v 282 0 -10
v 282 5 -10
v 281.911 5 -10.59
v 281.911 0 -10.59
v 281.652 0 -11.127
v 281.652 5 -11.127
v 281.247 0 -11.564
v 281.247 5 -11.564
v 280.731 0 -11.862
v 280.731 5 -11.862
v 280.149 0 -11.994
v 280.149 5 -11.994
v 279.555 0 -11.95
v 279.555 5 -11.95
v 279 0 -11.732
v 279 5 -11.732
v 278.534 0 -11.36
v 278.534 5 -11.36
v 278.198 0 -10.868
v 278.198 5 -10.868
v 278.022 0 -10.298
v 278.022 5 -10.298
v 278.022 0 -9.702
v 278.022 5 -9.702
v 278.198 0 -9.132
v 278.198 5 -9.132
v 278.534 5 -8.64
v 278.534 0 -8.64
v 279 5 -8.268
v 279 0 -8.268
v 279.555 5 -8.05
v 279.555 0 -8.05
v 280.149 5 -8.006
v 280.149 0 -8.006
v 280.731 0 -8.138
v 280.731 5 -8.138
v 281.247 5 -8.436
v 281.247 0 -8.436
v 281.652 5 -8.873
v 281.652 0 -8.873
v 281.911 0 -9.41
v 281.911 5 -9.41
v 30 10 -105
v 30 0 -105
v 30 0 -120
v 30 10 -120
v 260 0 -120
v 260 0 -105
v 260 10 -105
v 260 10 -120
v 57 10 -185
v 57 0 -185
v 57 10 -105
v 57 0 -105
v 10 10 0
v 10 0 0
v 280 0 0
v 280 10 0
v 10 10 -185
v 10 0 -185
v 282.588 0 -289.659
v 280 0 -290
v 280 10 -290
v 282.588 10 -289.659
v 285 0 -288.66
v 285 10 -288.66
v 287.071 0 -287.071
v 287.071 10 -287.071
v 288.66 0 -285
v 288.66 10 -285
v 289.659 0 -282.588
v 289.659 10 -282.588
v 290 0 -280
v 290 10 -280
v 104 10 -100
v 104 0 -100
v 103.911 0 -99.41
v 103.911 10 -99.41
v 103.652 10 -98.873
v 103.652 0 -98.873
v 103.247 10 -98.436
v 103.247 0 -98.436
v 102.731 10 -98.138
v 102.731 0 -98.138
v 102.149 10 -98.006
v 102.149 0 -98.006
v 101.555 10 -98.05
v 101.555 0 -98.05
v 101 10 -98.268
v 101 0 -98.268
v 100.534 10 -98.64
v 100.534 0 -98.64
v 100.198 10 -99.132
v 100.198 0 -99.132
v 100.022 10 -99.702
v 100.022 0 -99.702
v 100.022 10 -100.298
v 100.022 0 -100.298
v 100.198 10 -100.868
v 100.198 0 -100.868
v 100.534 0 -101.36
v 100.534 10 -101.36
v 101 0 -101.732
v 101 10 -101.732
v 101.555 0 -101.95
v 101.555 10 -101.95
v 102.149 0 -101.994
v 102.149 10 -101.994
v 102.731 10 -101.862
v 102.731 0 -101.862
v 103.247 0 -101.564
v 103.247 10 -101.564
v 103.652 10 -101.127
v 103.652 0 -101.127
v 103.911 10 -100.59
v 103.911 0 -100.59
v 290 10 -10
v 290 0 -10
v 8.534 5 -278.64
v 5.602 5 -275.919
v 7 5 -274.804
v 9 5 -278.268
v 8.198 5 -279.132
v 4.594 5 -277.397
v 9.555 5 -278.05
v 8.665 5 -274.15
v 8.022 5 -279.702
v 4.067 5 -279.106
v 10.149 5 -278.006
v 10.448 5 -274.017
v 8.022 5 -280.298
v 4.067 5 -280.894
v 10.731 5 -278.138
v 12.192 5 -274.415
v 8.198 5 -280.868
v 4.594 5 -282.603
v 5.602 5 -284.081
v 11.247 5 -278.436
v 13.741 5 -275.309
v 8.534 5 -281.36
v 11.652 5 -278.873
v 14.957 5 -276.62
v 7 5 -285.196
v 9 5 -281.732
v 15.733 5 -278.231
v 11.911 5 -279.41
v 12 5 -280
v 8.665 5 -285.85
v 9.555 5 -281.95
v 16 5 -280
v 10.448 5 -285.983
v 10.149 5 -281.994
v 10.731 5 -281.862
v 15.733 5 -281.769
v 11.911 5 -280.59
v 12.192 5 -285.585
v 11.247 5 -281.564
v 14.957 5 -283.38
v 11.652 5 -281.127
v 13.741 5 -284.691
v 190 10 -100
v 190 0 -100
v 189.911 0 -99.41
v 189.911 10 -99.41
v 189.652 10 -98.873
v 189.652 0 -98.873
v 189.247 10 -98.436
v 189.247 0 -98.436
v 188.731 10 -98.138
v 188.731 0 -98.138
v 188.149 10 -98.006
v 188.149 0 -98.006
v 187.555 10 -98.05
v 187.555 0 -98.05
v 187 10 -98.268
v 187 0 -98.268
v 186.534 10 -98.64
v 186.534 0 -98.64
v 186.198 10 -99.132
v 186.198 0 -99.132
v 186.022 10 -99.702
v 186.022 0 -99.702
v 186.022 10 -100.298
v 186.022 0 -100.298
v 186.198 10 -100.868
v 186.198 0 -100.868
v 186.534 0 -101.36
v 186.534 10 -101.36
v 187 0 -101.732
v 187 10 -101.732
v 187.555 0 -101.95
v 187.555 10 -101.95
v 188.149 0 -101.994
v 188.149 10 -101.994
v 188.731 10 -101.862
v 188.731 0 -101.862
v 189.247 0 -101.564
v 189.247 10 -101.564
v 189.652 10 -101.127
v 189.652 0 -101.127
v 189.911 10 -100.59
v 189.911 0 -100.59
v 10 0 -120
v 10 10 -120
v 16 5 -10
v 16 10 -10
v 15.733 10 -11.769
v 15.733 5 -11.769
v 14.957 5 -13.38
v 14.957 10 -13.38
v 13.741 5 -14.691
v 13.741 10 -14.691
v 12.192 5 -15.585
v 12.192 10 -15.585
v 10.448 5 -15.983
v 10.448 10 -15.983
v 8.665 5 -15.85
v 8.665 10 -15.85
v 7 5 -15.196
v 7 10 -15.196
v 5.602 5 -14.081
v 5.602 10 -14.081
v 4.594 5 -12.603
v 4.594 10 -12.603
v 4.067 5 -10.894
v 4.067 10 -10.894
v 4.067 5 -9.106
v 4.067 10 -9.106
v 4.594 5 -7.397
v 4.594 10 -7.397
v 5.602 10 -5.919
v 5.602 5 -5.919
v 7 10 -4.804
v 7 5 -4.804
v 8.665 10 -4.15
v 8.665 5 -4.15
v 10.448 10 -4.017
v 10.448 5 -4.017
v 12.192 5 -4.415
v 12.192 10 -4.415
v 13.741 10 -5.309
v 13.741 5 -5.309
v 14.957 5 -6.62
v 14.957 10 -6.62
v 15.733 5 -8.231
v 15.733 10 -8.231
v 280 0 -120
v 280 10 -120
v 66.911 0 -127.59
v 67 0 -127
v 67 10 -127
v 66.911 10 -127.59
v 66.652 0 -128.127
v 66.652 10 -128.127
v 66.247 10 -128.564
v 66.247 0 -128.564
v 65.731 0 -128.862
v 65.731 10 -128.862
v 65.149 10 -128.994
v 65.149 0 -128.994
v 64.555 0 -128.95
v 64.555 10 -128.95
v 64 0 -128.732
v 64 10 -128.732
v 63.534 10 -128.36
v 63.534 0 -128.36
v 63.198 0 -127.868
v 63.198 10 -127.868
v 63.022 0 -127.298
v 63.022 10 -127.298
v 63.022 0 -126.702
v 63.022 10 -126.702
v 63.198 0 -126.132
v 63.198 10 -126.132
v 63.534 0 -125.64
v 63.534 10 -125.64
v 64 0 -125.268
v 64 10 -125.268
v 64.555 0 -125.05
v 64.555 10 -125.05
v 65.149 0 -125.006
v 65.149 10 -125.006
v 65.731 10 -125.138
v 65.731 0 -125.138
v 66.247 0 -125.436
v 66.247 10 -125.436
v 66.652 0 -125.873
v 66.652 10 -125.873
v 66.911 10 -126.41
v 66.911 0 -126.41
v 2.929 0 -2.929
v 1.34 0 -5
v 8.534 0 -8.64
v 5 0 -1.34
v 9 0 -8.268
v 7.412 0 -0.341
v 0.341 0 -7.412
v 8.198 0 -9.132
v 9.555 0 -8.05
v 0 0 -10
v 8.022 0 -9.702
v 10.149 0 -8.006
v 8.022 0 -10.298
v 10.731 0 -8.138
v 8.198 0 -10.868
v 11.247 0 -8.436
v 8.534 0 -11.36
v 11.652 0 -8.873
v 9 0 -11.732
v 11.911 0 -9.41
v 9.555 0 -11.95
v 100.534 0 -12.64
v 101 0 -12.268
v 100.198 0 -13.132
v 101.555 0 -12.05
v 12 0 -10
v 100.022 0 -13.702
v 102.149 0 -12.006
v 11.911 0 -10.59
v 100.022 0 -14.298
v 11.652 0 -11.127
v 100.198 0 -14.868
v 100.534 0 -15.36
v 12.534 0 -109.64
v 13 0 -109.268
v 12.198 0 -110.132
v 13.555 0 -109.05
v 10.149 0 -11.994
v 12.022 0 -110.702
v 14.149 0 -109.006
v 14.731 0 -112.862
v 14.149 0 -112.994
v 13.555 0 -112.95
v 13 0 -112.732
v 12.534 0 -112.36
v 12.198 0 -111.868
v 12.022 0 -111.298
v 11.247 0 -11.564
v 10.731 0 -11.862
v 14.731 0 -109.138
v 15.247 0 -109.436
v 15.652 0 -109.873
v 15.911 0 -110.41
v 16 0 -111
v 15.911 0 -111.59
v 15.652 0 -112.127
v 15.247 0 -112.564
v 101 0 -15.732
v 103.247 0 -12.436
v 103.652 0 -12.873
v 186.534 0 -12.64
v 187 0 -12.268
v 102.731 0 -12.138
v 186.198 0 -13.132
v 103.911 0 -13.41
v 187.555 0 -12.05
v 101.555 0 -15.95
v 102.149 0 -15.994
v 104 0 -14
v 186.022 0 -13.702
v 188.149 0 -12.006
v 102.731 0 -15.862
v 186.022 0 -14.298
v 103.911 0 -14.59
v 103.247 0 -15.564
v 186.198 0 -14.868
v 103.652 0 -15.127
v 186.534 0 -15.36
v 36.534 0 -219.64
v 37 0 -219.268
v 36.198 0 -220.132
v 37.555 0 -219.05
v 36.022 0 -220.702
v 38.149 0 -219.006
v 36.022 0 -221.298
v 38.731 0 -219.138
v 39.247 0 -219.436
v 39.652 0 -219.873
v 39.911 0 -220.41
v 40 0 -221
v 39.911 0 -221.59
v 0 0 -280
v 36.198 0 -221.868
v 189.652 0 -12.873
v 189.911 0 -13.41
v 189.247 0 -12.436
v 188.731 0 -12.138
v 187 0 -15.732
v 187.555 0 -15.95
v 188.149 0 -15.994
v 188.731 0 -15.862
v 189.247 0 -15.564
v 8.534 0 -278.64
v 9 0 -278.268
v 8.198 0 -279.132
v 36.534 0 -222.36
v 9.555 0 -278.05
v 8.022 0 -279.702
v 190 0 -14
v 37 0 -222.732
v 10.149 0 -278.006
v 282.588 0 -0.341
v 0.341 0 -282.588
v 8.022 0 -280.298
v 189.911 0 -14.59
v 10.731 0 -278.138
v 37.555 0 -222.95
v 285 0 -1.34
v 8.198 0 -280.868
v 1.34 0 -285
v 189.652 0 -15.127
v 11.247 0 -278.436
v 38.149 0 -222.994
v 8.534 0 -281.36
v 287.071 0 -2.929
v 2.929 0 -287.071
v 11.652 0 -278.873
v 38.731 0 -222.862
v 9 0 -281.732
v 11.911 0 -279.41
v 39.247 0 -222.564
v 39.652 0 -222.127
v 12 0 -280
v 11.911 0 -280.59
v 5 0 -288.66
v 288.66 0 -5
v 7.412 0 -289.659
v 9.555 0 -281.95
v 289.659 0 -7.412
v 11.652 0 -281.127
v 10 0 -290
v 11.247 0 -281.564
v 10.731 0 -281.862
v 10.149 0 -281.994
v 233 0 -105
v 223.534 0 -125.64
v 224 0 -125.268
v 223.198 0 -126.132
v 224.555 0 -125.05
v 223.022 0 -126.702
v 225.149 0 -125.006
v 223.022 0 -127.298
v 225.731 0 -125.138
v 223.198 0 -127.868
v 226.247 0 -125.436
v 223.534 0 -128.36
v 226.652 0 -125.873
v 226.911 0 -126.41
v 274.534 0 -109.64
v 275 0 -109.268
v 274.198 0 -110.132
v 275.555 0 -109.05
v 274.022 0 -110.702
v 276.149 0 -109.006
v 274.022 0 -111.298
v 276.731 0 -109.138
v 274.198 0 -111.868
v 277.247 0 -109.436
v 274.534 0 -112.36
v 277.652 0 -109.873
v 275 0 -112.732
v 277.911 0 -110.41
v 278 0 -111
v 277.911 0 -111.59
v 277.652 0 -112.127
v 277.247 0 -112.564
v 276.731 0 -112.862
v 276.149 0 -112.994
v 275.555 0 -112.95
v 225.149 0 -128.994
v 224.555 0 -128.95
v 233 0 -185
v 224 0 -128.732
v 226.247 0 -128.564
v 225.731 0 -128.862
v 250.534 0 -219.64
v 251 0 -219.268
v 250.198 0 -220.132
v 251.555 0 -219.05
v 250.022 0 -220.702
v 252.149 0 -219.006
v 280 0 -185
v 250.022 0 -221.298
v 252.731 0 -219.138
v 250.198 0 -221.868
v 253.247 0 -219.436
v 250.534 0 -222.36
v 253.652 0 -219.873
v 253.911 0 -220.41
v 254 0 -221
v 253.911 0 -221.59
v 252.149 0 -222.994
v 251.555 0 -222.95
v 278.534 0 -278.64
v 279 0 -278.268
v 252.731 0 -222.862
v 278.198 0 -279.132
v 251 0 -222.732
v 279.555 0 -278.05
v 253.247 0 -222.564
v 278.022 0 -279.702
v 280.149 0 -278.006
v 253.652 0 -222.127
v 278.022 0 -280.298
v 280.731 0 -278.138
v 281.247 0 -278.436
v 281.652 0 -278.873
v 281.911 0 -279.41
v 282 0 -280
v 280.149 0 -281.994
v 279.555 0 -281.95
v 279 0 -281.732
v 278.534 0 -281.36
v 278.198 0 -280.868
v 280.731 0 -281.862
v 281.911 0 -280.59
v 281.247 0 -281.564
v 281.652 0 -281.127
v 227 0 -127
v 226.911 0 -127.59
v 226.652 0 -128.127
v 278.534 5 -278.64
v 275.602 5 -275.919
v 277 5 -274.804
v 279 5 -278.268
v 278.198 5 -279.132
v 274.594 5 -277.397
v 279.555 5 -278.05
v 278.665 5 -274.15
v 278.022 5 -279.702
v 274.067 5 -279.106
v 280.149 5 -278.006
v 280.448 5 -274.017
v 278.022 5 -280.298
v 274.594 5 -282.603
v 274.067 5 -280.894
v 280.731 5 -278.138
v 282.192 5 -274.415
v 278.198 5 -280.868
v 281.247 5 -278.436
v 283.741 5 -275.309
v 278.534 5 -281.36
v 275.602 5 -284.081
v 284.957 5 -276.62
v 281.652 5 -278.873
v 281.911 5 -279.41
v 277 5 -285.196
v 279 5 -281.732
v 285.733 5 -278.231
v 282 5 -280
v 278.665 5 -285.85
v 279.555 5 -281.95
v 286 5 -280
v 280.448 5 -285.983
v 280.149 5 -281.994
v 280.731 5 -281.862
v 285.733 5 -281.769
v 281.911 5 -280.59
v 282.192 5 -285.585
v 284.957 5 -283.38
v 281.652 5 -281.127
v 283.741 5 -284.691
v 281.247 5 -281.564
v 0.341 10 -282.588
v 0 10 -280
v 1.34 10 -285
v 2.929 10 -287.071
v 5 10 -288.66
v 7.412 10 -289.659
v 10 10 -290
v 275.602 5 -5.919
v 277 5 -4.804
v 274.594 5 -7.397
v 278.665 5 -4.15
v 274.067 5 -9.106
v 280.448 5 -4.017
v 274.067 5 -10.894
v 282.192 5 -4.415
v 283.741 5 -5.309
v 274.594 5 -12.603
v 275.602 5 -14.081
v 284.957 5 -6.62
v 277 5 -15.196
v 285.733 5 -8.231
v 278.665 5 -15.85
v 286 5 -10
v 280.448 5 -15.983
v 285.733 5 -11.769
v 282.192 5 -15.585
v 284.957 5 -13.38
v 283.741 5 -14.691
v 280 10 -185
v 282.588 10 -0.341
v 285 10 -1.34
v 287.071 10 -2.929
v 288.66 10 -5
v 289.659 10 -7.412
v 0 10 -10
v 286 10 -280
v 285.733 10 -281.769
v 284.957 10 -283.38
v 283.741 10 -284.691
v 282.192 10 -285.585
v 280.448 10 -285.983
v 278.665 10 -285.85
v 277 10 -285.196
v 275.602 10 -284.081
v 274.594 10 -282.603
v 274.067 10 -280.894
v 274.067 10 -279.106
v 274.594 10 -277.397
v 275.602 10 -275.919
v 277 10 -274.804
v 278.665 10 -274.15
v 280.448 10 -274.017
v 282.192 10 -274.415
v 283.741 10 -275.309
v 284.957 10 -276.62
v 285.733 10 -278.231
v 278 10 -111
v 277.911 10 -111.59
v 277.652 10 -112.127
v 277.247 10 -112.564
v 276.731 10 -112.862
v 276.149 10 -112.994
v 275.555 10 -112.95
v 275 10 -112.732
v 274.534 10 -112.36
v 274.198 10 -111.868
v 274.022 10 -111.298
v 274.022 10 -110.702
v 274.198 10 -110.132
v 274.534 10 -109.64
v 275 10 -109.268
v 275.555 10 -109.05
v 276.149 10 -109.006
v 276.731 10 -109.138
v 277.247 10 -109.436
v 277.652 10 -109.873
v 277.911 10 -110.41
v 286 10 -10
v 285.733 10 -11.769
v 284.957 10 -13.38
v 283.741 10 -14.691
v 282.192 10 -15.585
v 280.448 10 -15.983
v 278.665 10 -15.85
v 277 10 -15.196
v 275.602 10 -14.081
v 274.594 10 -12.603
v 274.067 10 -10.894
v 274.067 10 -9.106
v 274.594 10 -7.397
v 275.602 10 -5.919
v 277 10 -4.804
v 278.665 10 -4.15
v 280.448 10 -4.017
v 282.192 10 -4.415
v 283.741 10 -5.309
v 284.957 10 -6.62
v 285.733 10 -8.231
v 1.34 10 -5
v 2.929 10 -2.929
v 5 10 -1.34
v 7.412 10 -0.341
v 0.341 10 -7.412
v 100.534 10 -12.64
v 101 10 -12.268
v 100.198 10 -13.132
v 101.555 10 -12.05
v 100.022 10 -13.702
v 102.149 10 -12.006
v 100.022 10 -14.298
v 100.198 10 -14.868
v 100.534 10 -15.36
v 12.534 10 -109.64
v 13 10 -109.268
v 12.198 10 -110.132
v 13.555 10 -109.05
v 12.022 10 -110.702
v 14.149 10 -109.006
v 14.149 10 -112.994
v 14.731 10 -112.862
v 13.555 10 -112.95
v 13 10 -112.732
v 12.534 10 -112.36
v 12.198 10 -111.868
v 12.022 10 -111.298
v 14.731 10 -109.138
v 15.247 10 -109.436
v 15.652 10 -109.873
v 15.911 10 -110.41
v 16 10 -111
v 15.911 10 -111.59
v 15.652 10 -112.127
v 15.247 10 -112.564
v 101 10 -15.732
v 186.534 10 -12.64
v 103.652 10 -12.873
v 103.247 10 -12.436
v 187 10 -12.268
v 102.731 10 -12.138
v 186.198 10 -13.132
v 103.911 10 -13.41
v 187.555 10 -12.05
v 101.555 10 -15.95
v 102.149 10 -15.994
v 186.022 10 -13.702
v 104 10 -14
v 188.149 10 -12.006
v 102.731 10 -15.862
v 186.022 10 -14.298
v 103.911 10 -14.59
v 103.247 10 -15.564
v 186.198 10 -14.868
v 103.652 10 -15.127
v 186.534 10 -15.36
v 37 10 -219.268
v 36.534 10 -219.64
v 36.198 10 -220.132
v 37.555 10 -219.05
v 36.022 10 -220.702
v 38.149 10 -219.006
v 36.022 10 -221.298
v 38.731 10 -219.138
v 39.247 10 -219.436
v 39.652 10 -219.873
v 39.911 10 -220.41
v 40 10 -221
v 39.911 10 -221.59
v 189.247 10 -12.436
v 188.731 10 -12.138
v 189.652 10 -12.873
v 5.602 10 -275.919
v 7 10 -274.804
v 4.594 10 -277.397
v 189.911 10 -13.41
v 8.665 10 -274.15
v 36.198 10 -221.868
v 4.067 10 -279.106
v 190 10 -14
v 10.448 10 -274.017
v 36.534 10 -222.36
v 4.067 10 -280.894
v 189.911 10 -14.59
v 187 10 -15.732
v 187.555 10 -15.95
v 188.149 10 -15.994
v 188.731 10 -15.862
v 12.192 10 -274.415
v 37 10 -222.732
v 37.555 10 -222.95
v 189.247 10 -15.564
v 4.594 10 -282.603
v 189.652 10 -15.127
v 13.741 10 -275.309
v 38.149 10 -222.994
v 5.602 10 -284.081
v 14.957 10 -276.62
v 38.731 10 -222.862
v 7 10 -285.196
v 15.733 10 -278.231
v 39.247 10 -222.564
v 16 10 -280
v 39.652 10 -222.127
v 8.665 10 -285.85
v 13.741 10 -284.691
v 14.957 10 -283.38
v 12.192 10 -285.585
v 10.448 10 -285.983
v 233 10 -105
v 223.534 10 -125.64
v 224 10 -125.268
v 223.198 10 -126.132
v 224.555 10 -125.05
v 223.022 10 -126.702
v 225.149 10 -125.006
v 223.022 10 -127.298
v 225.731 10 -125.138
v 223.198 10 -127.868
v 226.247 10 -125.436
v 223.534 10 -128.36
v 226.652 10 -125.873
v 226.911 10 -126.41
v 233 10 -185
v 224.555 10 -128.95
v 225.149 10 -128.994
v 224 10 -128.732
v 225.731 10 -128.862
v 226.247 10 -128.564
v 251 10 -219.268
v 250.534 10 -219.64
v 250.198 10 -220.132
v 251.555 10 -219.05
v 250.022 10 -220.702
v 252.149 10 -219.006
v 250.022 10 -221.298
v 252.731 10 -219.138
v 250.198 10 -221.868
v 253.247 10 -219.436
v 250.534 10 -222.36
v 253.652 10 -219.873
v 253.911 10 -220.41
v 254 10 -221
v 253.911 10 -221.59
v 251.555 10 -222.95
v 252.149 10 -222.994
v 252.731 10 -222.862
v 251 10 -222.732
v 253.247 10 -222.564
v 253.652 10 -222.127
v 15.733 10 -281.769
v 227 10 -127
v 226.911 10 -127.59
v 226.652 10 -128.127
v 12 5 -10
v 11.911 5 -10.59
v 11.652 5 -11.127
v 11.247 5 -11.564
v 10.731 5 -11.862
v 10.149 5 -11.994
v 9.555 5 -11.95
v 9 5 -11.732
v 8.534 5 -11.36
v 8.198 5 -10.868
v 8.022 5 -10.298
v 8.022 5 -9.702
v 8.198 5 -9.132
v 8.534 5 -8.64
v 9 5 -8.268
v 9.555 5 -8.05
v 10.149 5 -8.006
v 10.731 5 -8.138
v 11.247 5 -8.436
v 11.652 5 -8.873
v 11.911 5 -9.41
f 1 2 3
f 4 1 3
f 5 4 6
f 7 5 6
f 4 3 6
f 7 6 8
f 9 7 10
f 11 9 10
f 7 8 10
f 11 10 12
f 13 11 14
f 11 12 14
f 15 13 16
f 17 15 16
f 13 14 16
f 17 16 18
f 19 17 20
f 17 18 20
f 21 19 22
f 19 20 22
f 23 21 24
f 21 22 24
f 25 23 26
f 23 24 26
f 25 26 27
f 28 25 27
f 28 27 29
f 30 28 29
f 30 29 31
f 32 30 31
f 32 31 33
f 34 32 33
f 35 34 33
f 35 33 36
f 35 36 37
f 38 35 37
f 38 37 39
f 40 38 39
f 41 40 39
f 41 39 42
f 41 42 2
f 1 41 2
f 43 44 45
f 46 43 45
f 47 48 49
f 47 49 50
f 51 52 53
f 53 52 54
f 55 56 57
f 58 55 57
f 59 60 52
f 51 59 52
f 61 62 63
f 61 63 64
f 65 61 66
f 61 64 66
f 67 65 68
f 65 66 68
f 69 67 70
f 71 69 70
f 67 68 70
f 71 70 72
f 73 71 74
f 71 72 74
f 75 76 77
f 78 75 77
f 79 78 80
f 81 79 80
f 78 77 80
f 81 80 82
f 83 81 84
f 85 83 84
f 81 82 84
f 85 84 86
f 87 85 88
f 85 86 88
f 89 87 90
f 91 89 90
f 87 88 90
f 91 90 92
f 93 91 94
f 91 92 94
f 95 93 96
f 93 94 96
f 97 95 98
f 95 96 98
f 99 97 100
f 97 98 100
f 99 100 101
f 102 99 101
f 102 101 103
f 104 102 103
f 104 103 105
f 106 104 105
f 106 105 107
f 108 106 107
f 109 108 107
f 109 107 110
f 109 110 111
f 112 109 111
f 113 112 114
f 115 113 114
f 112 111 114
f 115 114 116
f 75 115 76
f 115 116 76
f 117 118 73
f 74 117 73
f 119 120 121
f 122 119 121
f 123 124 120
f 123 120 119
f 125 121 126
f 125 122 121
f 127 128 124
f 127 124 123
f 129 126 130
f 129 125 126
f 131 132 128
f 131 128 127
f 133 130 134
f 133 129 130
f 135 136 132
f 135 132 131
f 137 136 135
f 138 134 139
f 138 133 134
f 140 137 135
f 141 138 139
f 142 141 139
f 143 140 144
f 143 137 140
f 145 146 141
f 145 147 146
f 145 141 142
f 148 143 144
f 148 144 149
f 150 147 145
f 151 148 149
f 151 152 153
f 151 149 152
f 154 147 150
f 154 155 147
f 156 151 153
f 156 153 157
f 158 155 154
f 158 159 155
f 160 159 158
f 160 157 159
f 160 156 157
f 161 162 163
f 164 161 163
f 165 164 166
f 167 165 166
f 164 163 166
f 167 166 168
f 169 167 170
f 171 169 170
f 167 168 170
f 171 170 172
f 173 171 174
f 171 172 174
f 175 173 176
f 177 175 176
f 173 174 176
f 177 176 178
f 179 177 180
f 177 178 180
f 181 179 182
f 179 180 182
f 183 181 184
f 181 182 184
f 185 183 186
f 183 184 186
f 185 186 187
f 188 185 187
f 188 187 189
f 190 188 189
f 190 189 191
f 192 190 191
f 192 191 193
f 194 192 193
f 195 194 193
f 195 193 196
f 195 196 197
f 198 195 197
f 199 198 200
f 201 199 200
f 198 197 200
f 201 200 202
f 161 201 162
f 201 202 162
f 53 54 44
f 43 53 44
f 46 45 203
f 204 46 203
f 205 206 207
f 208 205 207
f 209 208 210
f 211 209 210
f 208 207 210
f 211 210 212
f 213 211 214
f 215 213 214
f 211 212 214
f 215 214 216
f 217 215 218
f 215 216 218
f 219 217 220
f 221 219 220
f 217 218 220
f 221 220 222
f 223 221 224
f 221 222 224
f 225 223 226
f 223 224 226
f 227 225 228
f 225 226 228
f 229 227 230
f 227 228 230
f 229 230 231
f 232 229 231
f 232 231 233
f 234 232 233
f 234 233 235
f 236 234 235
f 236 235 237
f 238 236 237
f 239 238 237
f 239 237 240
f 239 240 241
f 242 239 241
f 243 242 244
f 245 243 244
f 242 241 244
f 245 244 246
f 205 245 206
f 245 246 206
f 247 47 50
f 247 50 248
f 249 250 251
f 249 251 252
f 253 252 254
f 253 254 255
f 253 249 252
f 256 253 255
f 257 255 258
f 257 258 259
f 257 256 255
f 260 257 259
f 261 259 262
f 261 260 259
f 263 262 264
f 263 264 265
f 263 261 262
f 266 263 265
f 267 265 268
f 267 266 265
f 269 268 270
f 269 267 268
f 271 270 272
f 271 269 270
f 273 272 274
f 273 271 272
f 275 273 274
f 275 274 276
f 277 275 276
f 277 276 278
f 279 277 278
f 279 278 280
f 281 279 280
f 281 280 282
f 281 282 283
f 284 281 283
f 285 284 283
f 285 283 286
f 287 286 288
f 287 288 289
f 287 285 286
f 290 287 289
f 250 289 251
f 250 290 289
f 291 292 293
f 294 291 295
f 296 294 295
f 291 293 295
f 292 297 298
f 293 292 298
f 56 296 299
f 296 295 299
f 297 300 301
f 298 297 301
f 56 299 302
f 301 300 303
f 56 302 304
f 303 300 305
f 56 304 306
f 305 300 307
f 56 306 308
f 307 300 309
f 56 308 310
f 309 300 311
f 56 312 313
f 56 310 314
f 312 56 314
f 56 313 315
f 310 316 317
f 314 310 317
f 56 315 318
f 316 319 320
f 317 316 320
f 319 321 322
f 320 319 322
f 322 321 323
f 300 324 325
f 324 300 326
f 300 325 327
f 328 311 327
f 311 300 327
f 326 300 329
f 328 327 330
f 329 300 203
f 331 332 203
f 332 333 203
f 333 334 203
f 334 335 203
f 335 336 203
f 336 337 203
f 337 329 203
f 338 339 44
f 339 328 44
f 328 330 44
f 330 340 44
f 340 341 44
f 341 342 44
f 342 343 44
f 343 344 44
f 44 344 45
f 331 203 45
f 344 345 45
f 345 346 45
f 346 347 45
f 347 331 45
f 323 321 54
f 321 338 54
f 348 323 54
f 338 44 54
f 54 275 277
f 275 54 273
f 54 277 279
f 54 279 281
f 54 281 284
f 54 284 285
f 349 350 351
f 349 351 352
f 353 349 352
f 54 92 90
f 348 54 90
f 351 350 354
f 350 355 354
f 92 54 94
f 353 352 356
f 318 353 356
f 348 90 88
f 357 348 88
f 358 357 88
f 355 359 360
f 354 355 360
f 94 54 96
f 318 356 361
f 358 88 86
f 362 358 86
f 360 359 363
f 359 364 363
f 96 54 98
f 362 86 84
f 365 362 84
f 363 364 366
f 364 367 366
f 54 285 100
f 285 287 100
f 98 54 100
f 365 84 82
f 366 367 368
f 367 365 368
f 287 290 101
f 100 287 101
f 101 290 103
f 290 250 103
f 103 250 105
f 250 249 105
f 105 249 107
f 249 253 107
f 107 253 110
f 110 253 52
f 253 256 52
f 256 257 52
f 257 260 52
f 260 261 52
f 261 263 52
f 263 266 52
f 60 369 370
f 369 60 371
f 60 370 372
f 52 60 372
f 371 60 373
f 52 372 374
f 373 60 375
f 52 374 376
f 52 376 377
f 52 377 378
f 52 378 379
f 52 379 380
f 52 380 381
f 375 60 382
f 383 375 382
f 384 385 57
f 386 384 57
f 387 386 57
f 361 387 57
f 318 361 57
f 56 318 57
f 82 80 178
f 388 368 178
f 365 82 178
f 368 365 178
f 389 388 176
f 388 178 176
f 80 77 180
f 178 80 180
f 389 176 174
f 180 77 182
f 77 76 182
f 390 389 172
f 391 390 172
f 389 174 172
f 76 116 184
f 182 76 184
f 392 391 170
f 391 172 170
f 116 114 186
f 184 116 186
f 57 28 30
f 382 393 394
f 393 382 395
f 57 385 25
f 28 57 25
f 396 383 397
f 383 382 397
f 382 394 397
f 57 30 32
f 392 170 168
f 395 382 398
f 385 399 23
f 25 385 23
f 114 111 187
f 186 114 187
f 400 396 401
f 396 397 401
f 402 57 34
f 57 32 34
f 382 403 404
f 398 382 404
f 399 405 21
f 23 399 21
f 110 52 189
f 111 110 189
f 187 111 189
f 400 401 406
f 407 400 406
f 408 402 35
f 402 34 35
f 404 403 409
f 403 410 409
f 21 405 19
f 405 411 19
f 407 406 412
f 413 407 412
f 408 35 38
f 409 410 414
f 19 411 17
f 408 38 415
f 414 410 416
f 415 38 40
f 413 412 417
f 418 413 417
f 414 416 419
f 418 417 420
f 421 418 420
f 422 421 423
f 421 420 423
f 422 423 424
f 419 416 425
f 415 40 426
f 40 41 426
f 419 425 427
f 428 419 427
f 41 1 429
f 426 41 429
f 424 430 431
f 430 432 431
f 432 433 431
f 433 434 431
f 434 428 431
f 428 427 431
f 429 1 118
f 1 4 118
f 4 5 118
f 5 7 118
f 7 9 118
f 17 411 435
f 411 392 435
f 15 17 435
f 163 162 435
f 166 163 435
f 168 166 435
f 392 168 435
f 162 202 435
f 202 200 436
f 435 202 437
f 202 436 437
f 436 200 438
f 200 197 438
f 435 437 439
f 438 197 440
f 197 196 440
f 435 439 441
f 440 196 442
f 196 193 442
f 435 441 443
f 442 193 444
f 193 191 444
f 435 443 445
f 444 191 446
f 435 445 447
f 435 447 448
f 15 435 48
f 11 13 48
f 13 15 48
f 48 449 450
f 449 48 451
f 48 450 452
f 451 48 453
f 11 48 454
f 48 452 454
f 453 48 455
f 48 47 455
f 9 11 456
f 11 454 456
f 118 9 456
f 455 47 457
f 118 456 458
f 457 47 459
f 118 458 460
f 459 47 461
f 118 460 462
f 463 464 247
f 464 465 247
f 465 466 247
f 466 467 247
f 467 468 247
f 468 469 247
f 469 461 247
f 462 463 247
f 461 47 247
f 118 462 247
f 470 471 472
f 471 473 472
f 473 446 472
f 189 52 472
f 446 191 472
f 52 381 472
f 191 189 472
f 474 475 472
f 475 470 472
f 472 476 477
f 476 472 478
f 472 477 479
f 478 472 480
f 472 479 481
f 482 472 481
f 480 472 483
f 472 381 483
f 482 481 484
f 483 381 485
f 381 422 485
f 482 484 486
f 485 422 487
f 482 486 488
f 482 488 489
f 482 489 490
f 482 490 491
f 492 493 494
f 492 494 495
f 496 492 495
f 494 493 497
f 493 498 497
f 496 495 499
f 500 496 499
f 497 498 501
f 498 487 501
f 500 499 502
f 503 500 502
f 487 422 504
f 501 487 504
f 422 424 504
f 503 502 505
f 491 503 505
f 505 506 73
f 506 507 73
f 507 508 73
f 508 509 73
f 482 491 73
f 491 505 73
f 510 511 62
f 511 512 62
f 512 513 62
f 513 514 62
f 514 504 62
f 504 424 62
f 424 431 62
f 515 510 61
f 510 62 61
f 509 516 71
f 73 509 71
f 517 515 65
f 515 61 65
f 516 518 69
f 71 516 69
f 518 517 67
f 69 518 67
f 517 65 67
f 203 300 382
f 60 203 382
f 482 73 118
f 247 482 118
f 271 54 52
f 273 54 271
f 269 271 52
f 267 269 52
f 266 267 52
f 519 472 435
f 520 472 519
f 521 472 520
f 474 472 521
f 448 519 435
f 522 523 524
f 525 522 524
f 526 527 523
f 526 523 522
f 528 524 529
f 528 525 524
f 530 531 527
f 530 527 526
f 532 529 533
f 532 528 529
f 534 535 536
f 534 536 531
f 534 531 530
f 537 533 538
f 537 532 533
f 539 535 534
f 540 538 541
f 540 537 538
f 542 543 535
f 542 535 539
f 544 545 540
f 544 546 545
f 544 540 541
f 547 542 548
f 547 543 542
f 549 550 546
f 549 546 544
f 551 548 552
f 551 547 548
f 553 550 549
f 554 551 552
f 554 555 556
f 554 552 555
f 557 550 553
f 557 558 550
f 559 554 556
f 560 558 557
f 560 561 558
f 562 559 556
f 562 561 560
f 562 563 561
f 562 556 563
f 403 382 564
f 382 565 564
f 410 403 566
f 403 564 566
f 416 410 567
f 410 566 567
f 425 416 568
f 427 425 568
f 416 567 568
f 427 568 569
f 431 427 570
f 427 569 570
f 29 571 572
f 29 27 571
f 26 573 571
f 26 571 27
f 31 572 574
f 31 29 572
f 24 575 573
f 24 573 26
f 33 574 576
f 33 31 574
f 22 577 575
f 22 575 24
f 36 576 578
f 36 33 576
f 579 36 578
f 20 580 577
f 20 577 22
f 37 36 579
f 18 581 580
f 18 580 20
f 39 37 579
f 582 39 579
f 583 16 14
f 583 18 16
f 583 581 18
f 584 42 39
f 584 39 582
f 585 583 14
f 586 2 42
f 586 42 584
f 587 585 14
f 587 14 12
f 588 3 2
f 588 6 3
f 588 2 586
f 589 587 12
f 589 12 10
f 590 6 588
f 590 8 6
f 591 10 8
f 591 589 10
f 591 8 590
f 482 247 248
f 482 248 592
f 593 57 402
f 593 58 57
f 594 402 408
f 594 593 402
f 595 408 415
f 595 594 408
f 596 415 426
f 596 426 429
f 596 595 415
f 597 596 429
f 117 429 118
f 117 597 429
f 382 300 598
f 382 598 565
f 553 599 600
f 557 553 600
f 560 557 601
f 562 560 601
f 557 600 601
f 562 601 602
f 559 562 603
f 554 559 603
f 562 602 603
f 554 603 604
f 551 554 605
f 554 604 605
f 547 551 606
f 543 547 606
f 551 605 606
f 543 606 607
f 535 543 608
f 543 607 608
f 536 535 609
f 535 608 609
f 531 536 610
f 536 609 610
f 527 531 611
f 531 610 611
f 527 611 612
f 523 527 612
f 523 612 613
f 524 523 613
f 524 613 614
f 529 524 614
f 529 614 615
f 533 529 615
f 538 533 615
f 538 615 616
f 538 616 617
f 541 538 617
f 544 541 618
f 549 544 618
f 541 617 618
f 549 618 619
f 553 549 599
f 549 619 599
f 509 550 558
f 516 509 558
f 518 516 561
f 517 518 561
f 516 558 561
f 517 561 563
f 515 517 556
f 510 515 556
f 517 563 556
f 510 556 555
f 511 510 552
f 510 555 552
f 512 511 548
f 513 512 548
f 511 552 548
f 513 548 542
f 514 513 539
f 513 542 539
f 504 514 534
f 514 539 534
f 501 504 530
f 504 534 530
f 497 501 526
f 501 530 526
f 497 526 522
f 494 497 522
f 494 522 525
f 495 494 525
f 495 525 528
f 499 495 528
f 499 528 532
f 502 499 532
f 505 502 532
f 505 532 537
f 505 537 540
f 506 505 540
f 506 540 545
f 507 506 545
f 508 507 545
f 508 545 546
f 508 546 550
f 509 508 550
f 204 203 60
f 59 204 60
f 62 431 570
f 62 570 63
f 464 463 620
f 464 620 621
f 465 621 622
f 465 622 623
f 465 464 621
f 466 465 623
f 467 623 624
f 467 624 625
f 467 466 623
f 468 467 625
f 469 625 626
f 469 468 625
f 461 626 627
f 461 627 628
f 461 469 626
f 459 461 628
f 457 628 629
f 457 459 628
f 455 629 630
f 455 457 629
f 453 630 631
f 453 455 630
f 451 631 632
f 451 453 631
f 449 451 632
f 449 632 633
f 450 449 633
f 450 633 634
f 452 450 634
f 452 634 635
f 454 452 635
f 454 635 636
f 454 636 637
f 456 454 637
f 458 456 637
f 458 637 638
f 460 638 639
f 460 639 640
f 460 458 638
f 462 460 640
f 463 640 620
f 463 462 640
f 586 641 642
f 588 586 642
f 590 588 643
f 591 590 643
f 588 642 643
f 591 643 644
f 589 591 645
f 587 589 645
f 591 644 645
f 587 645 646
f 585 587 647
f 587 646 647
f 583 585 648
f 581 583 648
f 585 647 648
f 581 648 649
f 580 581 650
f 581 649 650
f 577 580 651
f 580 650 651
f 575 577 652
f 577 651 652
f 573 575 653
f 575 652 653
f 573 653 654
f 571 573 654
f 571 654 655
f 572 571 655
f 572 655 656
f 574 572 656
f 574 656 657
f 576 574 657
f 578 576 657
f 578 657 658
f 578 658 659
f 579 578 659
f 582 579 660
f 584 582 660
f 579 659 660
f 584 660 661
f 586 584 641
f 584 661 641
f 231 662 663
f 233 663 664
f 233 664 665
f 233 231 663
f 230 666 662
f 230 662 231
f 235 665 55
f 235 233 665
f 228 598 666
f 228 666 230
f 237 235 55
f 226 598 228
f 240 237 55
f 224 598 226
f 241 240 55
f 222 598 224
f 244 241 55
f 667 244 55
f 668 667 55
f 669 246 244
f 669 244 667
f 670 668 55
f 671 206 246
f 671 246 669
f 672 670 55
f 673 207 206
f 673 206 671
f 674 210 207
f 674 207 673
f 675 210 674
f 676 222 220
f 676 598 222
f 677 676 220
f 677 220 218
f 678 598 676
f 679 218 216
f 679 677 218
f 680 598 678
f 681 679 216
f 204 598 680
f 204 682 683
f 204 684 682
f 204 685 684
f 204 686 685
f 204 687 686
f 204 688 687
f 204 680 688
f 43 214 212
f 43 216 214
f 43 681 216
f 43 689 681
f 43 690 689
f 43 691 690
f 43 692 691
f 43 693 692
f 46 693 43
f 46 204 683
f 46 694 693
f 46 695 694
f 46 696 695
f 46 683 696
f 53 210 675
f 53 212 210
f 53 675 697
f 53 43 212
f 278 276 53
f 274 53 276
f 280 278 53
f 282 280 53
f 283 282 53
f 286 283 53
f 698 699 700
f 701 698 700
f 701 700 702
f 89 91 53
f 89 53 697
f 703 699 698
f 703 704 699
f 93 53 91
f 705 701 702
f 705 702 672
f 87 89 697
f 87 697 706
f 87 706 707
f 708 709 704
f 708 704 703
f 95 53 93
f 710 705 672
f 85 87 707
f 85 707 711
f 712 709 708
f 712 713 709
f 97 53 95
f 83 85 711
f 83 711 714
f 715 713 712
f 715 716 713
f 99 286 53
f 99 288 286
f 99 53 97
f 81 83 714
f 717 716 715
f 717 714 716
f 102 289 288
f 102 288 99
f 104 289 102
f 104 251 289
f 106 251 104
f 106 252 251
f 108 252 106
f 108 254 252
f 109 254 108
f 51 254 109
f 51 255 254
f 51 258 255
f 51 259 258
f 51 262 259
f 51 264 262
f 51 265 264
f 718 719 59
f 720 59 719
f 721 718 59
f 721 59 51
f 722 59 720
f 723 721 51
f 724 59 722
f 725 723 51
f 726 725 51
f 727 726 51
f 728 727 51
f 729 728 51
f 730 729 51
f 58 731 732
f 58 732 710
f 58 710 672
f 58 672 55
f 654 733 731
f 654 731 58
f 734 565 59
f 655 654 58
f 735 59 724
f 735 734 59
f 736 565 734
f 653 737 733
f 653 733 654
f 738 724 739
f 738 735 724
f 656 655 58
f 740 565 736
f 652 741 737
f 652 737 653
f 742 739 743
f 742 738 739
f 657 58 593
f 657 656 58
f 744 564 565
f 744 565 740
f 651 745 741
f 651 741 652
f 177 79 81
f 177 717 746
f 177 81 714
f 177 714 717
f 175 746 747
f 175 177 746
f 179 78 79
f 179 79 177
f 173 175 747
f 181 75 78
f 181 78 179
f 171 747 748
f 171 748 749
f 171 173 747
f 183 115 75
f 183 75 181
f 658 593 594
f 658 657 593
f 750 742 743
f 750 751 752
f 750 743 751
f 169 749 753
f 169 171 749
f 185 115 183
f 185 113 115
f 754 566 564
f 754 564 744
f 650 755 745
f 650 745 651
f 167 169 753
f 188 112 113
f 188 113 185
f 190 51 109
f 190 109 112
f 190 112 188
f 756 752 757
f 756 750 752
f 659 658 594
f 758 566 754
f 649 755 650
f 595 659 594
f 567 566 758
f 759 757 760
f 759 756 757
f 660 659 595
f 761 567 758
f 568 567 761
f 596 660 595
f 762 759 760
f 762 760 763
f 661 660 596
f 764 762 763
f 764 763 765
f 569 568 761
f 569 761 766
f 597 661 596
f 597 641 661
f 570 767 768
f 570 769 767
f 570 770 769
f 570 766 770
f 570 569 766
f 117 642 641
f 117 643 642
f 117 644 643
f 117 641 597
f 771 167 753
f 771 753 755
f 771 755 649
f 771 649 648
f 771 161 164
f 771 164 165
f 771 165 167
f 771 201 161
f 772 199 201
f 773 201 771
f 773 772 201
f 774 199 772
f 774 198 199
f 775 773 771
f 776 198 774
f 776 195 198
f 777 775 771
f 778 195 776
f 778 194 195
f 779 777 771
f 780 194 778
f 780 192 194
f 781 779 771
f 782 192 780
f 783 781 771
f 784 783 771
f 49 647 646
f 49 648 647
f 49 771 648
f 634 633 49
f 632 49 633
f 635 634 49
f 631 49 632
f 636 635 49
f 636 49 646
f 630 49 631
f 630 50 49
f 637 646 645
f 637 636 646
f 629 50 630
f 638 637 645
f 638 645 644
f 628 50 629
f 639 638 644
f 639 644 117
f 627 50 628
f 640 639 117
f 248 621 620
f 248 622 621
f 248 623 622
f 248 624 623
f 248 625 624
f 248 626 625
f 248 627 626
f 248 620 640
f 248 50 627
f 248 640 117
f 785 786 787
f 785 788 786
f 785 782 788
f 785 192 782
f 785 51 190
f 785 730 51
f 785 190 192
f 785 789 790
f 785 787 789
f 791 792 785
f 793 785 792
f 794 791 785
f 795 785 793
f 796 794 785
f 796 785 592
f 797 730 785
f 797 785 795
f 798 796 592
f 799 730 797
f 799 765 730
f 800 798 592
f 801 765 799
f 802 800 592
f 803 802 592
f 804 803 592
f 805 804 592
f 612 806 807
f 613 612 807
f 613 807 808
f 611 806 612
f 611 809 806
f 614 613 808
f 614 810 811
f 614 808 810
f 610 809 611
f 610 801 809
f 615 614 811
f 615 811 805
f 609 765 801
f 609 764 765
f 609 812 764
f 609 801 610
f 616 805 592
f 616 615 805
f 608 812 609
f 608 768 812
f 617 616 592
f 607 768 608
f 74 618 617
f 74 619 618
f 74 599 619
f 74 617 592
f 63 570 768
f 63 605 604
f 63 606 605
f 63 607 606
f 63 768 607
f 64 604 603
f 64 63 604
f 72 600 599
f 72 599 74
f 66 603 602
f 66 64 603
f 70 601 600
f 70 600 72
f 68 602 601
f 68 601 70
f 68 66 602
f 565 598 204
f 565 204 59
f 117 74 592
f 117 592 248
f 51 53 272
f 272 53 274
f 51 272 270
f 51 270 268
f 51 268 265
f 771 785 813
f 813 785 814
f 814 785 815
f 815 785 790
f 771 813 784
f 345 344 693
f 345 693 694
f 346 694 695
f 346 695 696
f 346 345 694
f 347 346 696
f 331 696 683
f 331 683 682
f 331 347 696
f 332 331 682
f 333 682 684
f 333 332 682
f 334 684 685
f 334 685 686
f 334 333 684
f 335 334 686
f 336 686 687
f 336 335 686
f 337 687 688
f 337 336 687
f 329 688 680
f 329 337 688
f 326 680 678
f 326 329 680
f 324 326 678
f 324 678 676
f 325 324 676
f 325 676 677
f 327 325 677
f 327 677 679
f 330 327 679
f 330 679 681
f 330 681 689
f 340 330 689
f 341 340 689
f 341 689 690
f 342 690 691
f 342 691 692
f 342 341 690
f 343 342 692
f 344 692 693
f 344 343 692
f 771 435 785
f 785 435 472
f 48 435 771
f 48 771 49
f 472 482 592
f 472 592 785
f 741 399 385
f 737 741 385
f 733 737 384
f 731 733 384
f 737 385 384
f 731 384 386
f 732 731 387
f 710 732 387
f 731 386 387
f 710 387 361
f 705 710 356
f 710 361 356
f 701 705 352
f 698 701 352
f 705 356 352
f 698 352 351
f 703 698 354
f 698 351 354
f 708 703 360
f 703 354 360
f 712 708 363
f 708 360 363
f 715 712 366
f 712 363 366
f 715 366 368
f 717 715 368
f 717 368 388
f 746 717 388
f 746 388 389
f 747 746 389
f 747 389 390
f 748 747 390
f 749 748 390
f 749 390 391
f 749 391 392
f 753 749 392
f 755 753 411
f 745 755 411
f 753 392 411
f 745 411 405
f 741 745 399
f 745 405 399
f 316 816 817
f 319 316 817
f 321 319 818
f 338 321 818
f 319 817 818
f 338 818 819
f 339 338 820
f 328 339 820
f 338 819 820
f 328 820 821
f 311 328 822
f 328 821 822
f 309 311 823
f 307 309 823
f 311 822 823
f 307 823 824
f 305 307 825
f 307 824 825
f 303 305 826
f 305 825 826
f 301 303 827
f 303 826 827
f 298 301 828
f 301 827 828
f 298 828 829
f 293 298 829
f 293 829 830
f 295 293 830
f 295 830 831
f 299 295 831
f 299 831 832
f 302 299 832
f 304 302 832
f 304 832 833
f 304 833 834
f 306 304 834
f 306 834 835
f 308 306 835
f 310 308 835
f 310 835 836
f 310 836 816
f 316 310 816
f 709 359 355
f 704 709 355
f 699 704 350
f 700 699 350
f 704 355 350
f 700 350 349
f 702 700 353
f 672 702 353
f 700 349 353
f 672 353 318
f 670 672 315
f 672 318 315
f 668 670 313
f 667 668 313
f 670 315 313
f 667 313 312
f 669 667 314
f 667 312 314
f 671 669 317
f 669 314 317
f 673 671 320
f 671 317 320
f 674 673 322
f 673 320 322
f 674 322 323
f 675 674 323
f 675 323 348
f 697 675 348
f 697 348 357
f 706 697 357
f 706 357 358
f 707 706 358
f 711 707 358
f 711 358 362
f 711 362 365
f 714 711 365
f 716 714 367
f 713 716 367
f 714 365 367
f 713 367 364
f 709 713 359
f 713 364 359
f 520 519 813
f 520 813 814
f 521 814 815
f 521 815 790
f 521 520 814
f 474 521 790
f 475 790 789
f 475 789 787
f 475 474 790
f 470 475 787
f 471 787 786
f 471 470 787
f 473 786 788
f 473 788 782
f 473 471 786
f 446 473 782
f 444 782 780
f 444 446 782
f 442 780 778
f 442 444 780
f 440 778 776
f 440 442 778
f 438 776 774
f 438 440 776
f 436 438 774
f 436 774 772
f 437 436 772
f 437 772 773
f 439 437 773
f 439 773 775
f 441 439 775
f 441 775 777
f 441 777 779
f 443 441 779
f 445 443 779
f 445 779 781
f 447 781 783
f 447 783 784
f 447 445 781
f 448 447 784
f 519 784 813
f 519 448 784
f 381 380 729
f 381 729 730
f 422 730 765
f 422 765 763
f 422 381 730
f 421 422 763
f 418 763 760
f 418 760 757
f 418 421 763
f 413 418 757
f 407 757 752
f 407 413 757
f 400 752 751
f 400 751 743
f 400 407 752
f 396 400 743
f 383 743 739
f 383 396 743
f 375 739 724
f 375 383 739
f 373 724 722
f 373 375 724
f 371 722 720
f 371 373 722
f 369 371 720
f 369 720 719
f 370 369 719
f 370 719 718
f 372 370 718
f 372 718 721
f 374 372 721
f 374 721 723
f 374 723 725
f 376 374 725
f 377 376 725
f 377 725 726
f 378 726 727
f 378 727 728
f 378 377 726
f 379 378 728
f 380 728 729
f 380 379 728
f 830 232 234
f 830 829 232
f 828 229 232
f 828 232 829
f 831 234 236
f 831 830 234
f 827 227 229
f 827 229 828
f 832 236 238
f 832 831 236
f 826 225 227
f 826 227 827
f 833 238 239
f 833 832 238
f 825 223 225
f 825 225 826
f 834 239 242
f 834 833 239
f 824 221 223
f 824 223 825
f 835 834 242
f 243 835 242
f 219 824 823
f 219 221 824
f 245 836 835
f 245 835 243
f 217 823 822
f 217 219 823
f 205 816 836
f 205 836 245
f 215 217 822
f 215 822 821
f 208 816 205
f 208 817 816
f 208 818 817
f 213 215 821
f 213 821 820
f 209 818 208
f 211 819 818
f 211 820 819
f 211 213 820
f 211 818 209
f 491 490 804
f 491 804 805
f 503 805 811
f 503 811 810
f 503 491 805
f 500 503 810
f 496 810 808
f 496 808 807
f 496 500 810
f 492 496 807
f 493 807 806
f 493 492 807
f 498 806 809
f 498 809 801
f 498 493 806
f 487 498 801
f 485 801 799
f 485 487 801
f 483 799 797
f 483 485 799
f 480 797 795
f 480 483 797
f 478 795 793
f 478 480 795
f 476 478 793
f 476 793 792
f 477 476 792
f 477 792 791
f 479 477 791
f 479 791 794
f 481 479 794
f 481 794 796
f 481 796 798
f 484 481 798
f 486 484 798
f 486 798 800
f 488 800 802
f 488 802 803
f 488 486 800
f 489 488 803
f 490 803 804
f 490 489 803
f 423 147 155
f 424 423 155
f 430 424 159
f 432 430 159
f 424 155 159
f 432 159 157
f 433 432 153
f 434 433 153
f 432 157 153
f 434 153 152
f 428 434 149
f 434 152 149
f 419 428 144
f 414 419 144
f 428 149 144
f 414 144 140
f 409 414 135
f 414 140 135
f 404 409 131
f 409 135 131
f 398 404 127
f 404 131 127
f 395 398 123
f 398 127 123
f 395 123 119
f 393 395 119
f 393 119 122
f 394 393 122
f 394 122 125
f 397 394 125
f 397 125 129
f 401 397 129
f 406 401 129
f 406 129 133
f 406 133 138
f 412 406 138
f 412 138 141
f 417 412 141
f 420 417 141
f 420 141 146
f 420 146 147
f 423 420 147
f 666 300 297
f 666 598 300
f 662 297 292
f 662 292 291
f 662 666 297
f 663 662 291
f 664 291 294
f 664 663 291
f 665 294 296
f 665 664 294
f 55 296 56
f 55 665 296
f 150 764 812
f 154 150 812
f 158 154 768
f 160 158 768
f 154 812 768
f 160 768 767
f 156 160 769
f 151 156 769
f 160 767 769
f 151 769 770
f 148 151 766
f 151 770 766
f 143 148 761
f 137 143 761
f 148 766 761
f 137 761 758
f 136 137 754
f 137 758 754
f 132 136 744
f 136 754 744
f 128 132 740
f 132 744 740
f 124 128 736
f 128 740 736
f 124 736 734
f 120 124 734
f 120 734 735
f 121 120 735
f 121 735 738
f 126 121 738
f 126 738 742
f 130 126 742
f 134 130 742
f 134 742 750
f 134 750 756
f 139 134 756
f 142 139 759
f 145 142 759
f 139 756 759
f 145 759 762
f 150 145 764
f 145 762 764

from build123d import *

# Parameters (mm, degrees)
ESQUISSE2_W             = 290
ESQUISSE2_H             = 290
ESQUISSE2_R             = 2
BOSS_EXTRU_1_DEPTH      = 10
ESQUISSE3_R             = 2
ENL_V_MAT_EXTRU_1_DEPTH = 10
CONG_1_R                = 10
ESQUISSE4_R             = 6
ENL_V_MAT_EXTRU_2_DEPTH = 5
ESQUISSE5_R             = 2
ENL_V_MAT_EXTRU_3_DEPTH = 10


with BuildPart() as part:
    # Esquisse2 → Boss.-Extru.1 (new body)
    with BuildSketch(Plane(origin=(0, 0, 0), x_dir=(1, 0, 0), z_dir=(0, 1, 0))):
        with Locations((145, 145)):
            Rectangle(ESQUISSE2_W, ESQUISSE2_H)
        with Locations((276, 111)):
            Circle(ESQUISSE2_R, mode=Mode.SUBTRACT)
        with Locations((225, 127)):
            Circle(ESQUISSE2_R, mode=Mode.SUBTRACT)
        with Locations((252, 221)):
            Circle(ESQUISSE2_R, mode=Mode.SUBTRACT)
        with Locations((14, 111)):
            Circle(ESQUISSE2_R, mode=Mode.SUBTRACT)
        with Locations((65, 127)):
            Circle(ESQUISSE2_R, mode=Mode.SUBTRACT)
        with Locations((38, 221)):
            Circle(ESQUISSE2_R, mode=Mode.SUBTRACT)
        Polygon((233, 185), (233, 145), (233, 105), (260, 105), (260, 120), (280, 120), (280, 185), align=None, mode=Mode.SUBTRACT)
        Polygon((30, 105), (30, 120), (10, 120), (10, 185), (57, 185), (57, 145), (57, 105), align=None, mode=Mode.SUBTRACT)
    extrude(amount=BOSS_EXTRU_1_DEPTH)

    # Esquisse3 → Enlèv. mat.-Extru.1 (cut)
    with BuildSketch(Plane(origin=(0, 10, 0), x_dir=(1, 0, 0), z_dir=(0, 1, 0))):
        with Locations((10, 280)):
            Circle(ESQUISSE3_R)
        with Locations((280, 280)):
            Circle(ESQUISSE3_R)
        with Locations((280, 10)):
            Circle(ESQUISSE3_R)
        with Locations((10, 10)):
            Circle(ESQUISSE3_R)
    extrude(amount=-ENL_V_MAT_EXTRU_1_DEPTH, mode=Mode.SUBTRACT)

    # Congé1
    cong_1_edges = [part.edges().sort_by_distance(p)[0] for p in [
        (0, 5, -290),
        (290, 5, -290),
        (290, 5, 0),
        (0, 5, 0),
    ]]
    fillet(cong_1_edges, radius=CONG_1_R)

    # Esquisse4 → Enlèv. mat.-Extru.2 (cut)
    with BuildSketch(Plane(origin=(0, 10, 0), x_dir=(1, 0, 0), z_dir=(0, 1, 0))):
        with Locations((10, 280)):
            Circle(ESQUISSE4_R)
        with Locations((280, 280)):
            Circle(ESQUISSE4_R)
        with Locations((280, 10)):
            Circle(ESQUISSE4_R)
        with Locations((10, 10)):
            Circle(ESQUISSE4_R)
    extrude(amount=-ENL_V_MAT_EXTRU_2_DEPTH, mode=Mode.SUBTRACT)

    # Esquisse5 → Enlèv. mat.-Extru.3 (cut)
    with BuildSketch(Plane.XZ):
        with Locations((102, -14)):
            Circle(ESQUISSE5_R)
        with Locations((188, -14)):
            Circle(ESQUISSE5_R)
        with Locations((188, -100)):
            Circle(ESQUISSE5_R)
        with Locations((102, -100)):
            Circle(ESQUISSE5_R)
    extrude(amount=-ENL_V_MAT_EXTRU_3_DEPTH, mode=Mode.SUBTRACT)


solid = part.part
